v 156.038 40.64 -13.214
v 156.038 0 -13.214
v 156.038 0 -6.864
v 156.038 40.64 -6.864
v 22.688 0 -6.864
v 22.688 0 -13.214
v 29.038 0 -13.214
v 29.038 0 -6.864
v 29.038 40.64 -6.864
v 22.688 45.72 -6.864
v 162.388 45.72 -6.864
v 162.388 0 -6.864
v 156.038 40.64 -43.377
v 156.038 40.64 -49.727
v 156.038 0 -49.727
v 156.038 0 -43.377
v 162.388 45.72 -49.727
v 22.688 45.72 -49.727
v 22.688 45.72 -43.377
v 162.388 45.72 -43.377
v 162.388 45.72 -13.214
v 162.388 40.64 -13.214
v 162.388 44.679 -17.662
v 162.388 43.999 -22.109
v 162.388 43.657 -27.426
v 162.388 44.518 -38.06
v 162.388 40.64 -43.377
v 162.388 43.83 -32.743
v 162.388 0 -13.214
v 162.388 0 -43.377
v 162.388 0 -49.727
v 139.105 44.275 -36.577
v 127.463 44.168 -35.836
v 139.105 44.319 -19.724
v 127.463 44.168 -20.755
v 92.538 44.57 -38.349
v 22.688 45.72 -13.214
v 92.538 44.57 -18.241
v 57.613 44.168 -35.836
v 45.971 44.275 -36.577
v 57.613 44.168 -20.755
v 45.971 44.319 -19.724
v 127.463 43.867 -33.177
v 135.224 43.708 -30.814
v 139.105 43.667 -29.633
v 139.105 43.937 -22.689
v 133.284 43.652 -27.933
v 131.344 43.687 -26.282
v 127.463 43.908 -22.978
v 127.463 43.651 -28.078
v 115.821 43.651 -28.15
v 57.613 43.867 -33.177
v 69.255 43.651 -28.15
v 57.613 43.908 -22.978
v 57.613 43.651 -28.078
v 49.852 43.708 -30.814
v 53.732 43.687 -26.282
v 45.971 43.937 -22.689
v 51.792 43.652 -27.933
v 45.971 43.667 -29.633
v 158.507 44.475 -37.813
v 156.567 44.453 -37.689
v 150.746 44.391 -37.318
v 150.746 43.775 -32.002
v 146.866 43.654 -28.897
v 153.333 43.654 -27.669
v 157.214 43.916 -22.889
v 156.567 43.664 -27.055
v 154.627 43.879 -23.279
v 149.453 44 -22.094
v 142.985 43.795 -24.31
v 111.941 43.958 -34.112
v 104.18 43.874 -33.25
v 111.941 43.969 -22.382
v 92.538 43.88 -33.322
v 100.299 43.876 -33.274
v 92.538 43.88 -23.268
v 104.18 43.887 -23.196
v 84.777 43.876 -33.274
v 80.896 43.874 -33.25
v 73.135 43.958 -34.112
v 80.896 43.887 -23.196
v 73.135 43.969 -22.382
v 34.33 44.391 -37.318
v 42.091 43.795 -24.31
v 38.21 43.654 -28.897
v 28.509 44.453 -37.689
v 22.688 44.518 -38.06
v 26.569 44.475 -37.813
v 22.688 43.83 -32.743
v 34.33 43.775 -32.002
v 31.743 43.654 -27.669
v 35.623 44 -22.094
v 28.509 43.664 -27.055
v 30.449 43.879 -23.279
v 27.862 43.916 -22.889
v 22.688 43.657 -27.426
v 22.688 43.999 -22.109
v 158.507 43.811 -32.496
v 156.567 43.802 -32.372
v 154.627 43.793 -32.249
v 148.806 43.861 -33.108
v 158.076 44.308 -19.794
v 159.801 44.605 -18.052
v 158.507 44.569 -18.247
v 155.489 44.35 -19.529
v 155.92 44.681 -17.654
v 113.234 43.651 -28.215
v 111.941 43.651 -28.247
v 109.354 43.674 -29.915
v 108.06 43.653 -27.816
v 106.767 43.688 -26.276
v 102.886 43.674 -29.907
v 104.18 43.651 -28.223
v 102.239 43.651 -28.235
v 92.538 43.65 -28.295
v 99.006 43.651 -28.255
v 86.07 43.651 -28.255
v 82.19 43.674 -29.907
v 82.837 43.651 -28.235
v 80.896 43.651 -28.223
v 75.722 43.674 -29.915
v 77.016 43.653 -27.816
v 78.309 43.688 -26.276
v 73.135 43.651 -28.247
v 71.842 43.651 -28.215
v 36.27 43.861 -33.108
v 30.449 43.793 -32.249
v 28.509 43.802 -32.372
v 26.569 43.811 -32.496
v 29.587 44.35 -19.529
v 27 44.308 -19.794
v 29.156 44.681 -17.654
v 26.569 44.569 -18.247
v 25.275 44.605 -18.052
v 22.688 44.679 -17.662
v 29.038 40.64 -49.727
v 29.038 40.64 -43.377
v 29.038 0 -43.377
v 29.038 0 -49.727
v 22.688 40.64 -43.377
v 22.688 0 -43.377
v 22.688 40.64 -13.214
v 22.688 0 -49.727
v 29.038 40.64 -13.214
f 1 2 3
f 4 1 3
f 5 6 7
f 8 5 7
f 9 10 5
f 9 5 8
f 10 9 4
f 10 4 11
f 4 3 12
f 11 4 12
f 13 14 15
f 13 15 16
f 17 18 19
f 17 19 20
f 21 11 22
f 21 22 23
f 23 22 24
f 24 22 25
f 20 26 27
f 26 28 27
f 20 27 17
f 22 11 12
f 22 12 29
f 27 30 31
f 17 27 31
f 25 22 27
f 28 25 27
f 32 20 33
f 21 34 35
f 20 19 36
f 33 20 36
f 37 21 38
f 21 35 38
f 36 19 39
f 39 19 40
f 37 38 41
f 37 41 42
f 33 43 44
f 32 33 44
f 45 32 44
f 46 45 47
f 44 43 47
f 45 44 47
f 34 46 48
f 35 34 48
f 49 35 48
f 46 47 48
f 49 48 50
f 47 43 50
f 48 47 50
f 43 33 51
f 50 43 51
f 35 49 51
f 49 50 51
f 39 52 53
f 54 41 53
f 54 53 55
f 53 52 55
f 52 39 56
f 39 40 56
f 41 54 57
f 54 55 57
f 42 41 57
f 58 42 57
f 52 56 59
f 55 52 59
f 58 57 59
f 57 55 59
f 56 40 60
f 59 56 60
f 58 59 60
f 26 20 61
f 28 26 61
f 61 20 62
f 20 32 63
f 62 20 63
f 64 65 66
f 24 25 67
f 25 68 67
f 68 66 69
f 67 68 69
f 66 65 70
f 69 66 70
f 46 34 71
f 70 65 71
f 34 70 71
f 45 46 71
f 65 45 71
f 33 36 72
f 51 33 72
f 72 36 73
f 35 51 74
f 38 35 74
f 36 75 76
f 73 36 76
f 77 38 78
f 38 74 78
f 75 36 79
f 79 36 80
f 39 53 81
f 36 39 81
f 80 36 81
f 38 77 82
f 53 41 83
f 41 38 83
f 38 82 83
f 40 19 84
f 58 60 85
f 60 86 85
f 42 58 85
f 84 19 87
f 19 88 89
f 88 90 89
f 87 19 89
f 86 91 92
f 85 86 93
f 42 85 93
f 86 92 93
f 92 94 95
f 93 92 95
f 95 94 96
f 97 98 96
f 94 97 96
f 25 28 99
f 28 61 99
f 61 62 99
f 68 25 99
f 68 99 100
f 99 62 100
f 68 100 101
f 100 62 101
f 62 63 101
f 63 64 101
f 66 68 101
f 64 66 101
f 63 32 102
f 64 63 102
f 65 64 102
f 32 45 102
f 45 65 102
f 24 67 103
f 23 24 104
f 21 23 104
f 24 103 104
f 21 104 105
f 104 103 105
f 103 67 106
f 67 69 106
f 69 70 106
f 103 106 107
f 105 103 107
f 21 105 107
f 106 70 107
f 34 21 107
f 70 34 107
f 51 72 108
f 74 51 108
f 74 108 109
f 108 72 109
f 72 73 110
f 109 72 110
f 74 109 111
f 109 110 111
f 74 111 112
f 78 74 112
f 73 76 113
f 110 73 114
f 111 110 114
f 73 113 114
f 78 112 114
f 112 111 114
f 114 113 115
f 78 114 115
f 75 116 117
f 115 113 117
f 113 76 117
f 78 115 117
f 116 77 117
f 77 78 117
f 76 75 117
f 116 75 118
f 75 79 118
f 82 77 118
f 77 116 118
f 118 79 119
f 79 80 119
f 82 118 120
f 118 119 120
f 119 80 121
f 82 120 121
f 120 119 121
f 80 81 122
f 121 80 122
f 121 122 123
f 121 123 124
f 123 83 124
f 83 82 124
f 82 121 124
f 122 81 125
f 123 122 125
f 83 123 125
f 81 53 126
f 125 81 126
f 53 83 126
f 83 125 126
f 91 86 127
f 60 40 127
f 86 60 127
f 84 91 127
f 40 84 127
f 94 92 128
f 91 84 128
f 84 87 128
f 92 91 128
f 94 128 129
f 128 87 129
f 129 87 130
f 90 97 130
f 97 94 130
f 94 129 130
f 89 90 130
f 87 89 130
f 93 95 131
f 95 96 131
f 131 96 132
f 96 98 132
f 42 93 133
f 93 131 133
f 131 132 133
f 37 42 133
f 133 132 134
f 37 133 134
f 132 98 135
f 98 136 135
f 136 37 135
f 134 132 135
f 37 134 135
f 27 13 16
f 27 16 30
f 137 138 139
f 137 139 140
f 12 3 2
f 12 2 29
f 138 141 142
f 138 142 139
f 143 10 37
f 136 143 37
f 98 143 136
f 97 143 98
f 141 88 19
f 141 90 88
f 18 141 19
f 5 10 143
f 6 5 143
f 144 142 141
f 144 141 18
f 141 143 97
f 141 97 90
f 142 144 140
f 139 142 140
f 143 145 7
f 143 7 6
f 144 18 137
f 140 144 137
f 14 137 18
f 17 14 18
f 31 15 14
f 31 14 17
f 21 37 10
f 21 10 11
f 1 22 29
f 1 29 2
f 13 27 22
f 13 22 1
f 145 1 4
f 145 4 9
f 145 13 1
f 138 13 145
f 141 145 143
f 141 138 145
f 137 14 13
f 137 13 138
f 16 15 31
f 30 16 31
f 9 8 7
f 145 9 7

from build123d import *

# Parameters (mm, degrees)
SKETCH1_W               = 139.7
SKETCH1_H               = 42.8625
BOSS_EXTRUDE1_DEPTH     = 45.72
CUT_EXTRUDE2_DEPTH      = 40.64
CUT_EXTRUDE3_DEPTH      = 1
CUT_EXTRUDE3_DEPTH_BACK = 139.7


with BuildPart() as part:
    # Sketch1 → Boss-Extrude1 (new body)
    with BuildSketch(Plane(origin=(0, 0, 0), x_dir=(1, 0, 0), z_dir=(0, 1, 0))):
        with Locations((92.537965446, 28.29525747)):
            Rectangle(SKETCH1_W, SKETCH1_H)
    extrude(amount=BOSS_EXTRUDE1_DEPTH)

    # Sketch7 → Cut-Extrude2 (cut)
    with BuildSketch(Plane(origin=(0, 0, 0), x_dir=(1, 0, 0), z_dir=(0, 1, 0))):
        Polygon((22.687965446, 43.37650747), (29.037965446, 43.37650747), (29.037965446, 49.72650747), (156.037965446, 49.72650747), (156.037965446, 43.37650747), (162.387965446, 43.37650747), (162.387965446, 13.21400747), (156.037965446, 13.21400747), (156.037965446, 6.86400747), (29.037965446, 6.86400747), (29.037965446, 13.21400747), (22.687965446, 13.21400747), align=None)
    extrude(amount=CUT_EXTRUDE2_DEPTH, mode=Mode.SUBTRACT)

    # Sketch8 → Cut-Extrude3 (cut, two sides)
    with BuildSketch(Plane.ZY.offset(-22.687965446)) as cut_extrude3_sk:
        with BuildLine():
            Line((-13.21400747, 45.72), (-43.37650747, 45.72))
            add(Edge.make_bspline(
                [(-43.37650747, 45.72), (-28.29525747, 41.58097799), (-13.21400747, 45.72)],
                knots=[0, 0, 0, 1, 1, 1], degree=2))
        make_face()
    extrude(amount=CUT_EXTRUDE3_DEPTH, mode=Mode.SUBTRACT)
    extrude(cut_extrude3_sk.sketch, amount=-CUT_EXTRUDE3_DEPTH_BACK, mode=Mode.SUBTRACT)


solid = part.part
